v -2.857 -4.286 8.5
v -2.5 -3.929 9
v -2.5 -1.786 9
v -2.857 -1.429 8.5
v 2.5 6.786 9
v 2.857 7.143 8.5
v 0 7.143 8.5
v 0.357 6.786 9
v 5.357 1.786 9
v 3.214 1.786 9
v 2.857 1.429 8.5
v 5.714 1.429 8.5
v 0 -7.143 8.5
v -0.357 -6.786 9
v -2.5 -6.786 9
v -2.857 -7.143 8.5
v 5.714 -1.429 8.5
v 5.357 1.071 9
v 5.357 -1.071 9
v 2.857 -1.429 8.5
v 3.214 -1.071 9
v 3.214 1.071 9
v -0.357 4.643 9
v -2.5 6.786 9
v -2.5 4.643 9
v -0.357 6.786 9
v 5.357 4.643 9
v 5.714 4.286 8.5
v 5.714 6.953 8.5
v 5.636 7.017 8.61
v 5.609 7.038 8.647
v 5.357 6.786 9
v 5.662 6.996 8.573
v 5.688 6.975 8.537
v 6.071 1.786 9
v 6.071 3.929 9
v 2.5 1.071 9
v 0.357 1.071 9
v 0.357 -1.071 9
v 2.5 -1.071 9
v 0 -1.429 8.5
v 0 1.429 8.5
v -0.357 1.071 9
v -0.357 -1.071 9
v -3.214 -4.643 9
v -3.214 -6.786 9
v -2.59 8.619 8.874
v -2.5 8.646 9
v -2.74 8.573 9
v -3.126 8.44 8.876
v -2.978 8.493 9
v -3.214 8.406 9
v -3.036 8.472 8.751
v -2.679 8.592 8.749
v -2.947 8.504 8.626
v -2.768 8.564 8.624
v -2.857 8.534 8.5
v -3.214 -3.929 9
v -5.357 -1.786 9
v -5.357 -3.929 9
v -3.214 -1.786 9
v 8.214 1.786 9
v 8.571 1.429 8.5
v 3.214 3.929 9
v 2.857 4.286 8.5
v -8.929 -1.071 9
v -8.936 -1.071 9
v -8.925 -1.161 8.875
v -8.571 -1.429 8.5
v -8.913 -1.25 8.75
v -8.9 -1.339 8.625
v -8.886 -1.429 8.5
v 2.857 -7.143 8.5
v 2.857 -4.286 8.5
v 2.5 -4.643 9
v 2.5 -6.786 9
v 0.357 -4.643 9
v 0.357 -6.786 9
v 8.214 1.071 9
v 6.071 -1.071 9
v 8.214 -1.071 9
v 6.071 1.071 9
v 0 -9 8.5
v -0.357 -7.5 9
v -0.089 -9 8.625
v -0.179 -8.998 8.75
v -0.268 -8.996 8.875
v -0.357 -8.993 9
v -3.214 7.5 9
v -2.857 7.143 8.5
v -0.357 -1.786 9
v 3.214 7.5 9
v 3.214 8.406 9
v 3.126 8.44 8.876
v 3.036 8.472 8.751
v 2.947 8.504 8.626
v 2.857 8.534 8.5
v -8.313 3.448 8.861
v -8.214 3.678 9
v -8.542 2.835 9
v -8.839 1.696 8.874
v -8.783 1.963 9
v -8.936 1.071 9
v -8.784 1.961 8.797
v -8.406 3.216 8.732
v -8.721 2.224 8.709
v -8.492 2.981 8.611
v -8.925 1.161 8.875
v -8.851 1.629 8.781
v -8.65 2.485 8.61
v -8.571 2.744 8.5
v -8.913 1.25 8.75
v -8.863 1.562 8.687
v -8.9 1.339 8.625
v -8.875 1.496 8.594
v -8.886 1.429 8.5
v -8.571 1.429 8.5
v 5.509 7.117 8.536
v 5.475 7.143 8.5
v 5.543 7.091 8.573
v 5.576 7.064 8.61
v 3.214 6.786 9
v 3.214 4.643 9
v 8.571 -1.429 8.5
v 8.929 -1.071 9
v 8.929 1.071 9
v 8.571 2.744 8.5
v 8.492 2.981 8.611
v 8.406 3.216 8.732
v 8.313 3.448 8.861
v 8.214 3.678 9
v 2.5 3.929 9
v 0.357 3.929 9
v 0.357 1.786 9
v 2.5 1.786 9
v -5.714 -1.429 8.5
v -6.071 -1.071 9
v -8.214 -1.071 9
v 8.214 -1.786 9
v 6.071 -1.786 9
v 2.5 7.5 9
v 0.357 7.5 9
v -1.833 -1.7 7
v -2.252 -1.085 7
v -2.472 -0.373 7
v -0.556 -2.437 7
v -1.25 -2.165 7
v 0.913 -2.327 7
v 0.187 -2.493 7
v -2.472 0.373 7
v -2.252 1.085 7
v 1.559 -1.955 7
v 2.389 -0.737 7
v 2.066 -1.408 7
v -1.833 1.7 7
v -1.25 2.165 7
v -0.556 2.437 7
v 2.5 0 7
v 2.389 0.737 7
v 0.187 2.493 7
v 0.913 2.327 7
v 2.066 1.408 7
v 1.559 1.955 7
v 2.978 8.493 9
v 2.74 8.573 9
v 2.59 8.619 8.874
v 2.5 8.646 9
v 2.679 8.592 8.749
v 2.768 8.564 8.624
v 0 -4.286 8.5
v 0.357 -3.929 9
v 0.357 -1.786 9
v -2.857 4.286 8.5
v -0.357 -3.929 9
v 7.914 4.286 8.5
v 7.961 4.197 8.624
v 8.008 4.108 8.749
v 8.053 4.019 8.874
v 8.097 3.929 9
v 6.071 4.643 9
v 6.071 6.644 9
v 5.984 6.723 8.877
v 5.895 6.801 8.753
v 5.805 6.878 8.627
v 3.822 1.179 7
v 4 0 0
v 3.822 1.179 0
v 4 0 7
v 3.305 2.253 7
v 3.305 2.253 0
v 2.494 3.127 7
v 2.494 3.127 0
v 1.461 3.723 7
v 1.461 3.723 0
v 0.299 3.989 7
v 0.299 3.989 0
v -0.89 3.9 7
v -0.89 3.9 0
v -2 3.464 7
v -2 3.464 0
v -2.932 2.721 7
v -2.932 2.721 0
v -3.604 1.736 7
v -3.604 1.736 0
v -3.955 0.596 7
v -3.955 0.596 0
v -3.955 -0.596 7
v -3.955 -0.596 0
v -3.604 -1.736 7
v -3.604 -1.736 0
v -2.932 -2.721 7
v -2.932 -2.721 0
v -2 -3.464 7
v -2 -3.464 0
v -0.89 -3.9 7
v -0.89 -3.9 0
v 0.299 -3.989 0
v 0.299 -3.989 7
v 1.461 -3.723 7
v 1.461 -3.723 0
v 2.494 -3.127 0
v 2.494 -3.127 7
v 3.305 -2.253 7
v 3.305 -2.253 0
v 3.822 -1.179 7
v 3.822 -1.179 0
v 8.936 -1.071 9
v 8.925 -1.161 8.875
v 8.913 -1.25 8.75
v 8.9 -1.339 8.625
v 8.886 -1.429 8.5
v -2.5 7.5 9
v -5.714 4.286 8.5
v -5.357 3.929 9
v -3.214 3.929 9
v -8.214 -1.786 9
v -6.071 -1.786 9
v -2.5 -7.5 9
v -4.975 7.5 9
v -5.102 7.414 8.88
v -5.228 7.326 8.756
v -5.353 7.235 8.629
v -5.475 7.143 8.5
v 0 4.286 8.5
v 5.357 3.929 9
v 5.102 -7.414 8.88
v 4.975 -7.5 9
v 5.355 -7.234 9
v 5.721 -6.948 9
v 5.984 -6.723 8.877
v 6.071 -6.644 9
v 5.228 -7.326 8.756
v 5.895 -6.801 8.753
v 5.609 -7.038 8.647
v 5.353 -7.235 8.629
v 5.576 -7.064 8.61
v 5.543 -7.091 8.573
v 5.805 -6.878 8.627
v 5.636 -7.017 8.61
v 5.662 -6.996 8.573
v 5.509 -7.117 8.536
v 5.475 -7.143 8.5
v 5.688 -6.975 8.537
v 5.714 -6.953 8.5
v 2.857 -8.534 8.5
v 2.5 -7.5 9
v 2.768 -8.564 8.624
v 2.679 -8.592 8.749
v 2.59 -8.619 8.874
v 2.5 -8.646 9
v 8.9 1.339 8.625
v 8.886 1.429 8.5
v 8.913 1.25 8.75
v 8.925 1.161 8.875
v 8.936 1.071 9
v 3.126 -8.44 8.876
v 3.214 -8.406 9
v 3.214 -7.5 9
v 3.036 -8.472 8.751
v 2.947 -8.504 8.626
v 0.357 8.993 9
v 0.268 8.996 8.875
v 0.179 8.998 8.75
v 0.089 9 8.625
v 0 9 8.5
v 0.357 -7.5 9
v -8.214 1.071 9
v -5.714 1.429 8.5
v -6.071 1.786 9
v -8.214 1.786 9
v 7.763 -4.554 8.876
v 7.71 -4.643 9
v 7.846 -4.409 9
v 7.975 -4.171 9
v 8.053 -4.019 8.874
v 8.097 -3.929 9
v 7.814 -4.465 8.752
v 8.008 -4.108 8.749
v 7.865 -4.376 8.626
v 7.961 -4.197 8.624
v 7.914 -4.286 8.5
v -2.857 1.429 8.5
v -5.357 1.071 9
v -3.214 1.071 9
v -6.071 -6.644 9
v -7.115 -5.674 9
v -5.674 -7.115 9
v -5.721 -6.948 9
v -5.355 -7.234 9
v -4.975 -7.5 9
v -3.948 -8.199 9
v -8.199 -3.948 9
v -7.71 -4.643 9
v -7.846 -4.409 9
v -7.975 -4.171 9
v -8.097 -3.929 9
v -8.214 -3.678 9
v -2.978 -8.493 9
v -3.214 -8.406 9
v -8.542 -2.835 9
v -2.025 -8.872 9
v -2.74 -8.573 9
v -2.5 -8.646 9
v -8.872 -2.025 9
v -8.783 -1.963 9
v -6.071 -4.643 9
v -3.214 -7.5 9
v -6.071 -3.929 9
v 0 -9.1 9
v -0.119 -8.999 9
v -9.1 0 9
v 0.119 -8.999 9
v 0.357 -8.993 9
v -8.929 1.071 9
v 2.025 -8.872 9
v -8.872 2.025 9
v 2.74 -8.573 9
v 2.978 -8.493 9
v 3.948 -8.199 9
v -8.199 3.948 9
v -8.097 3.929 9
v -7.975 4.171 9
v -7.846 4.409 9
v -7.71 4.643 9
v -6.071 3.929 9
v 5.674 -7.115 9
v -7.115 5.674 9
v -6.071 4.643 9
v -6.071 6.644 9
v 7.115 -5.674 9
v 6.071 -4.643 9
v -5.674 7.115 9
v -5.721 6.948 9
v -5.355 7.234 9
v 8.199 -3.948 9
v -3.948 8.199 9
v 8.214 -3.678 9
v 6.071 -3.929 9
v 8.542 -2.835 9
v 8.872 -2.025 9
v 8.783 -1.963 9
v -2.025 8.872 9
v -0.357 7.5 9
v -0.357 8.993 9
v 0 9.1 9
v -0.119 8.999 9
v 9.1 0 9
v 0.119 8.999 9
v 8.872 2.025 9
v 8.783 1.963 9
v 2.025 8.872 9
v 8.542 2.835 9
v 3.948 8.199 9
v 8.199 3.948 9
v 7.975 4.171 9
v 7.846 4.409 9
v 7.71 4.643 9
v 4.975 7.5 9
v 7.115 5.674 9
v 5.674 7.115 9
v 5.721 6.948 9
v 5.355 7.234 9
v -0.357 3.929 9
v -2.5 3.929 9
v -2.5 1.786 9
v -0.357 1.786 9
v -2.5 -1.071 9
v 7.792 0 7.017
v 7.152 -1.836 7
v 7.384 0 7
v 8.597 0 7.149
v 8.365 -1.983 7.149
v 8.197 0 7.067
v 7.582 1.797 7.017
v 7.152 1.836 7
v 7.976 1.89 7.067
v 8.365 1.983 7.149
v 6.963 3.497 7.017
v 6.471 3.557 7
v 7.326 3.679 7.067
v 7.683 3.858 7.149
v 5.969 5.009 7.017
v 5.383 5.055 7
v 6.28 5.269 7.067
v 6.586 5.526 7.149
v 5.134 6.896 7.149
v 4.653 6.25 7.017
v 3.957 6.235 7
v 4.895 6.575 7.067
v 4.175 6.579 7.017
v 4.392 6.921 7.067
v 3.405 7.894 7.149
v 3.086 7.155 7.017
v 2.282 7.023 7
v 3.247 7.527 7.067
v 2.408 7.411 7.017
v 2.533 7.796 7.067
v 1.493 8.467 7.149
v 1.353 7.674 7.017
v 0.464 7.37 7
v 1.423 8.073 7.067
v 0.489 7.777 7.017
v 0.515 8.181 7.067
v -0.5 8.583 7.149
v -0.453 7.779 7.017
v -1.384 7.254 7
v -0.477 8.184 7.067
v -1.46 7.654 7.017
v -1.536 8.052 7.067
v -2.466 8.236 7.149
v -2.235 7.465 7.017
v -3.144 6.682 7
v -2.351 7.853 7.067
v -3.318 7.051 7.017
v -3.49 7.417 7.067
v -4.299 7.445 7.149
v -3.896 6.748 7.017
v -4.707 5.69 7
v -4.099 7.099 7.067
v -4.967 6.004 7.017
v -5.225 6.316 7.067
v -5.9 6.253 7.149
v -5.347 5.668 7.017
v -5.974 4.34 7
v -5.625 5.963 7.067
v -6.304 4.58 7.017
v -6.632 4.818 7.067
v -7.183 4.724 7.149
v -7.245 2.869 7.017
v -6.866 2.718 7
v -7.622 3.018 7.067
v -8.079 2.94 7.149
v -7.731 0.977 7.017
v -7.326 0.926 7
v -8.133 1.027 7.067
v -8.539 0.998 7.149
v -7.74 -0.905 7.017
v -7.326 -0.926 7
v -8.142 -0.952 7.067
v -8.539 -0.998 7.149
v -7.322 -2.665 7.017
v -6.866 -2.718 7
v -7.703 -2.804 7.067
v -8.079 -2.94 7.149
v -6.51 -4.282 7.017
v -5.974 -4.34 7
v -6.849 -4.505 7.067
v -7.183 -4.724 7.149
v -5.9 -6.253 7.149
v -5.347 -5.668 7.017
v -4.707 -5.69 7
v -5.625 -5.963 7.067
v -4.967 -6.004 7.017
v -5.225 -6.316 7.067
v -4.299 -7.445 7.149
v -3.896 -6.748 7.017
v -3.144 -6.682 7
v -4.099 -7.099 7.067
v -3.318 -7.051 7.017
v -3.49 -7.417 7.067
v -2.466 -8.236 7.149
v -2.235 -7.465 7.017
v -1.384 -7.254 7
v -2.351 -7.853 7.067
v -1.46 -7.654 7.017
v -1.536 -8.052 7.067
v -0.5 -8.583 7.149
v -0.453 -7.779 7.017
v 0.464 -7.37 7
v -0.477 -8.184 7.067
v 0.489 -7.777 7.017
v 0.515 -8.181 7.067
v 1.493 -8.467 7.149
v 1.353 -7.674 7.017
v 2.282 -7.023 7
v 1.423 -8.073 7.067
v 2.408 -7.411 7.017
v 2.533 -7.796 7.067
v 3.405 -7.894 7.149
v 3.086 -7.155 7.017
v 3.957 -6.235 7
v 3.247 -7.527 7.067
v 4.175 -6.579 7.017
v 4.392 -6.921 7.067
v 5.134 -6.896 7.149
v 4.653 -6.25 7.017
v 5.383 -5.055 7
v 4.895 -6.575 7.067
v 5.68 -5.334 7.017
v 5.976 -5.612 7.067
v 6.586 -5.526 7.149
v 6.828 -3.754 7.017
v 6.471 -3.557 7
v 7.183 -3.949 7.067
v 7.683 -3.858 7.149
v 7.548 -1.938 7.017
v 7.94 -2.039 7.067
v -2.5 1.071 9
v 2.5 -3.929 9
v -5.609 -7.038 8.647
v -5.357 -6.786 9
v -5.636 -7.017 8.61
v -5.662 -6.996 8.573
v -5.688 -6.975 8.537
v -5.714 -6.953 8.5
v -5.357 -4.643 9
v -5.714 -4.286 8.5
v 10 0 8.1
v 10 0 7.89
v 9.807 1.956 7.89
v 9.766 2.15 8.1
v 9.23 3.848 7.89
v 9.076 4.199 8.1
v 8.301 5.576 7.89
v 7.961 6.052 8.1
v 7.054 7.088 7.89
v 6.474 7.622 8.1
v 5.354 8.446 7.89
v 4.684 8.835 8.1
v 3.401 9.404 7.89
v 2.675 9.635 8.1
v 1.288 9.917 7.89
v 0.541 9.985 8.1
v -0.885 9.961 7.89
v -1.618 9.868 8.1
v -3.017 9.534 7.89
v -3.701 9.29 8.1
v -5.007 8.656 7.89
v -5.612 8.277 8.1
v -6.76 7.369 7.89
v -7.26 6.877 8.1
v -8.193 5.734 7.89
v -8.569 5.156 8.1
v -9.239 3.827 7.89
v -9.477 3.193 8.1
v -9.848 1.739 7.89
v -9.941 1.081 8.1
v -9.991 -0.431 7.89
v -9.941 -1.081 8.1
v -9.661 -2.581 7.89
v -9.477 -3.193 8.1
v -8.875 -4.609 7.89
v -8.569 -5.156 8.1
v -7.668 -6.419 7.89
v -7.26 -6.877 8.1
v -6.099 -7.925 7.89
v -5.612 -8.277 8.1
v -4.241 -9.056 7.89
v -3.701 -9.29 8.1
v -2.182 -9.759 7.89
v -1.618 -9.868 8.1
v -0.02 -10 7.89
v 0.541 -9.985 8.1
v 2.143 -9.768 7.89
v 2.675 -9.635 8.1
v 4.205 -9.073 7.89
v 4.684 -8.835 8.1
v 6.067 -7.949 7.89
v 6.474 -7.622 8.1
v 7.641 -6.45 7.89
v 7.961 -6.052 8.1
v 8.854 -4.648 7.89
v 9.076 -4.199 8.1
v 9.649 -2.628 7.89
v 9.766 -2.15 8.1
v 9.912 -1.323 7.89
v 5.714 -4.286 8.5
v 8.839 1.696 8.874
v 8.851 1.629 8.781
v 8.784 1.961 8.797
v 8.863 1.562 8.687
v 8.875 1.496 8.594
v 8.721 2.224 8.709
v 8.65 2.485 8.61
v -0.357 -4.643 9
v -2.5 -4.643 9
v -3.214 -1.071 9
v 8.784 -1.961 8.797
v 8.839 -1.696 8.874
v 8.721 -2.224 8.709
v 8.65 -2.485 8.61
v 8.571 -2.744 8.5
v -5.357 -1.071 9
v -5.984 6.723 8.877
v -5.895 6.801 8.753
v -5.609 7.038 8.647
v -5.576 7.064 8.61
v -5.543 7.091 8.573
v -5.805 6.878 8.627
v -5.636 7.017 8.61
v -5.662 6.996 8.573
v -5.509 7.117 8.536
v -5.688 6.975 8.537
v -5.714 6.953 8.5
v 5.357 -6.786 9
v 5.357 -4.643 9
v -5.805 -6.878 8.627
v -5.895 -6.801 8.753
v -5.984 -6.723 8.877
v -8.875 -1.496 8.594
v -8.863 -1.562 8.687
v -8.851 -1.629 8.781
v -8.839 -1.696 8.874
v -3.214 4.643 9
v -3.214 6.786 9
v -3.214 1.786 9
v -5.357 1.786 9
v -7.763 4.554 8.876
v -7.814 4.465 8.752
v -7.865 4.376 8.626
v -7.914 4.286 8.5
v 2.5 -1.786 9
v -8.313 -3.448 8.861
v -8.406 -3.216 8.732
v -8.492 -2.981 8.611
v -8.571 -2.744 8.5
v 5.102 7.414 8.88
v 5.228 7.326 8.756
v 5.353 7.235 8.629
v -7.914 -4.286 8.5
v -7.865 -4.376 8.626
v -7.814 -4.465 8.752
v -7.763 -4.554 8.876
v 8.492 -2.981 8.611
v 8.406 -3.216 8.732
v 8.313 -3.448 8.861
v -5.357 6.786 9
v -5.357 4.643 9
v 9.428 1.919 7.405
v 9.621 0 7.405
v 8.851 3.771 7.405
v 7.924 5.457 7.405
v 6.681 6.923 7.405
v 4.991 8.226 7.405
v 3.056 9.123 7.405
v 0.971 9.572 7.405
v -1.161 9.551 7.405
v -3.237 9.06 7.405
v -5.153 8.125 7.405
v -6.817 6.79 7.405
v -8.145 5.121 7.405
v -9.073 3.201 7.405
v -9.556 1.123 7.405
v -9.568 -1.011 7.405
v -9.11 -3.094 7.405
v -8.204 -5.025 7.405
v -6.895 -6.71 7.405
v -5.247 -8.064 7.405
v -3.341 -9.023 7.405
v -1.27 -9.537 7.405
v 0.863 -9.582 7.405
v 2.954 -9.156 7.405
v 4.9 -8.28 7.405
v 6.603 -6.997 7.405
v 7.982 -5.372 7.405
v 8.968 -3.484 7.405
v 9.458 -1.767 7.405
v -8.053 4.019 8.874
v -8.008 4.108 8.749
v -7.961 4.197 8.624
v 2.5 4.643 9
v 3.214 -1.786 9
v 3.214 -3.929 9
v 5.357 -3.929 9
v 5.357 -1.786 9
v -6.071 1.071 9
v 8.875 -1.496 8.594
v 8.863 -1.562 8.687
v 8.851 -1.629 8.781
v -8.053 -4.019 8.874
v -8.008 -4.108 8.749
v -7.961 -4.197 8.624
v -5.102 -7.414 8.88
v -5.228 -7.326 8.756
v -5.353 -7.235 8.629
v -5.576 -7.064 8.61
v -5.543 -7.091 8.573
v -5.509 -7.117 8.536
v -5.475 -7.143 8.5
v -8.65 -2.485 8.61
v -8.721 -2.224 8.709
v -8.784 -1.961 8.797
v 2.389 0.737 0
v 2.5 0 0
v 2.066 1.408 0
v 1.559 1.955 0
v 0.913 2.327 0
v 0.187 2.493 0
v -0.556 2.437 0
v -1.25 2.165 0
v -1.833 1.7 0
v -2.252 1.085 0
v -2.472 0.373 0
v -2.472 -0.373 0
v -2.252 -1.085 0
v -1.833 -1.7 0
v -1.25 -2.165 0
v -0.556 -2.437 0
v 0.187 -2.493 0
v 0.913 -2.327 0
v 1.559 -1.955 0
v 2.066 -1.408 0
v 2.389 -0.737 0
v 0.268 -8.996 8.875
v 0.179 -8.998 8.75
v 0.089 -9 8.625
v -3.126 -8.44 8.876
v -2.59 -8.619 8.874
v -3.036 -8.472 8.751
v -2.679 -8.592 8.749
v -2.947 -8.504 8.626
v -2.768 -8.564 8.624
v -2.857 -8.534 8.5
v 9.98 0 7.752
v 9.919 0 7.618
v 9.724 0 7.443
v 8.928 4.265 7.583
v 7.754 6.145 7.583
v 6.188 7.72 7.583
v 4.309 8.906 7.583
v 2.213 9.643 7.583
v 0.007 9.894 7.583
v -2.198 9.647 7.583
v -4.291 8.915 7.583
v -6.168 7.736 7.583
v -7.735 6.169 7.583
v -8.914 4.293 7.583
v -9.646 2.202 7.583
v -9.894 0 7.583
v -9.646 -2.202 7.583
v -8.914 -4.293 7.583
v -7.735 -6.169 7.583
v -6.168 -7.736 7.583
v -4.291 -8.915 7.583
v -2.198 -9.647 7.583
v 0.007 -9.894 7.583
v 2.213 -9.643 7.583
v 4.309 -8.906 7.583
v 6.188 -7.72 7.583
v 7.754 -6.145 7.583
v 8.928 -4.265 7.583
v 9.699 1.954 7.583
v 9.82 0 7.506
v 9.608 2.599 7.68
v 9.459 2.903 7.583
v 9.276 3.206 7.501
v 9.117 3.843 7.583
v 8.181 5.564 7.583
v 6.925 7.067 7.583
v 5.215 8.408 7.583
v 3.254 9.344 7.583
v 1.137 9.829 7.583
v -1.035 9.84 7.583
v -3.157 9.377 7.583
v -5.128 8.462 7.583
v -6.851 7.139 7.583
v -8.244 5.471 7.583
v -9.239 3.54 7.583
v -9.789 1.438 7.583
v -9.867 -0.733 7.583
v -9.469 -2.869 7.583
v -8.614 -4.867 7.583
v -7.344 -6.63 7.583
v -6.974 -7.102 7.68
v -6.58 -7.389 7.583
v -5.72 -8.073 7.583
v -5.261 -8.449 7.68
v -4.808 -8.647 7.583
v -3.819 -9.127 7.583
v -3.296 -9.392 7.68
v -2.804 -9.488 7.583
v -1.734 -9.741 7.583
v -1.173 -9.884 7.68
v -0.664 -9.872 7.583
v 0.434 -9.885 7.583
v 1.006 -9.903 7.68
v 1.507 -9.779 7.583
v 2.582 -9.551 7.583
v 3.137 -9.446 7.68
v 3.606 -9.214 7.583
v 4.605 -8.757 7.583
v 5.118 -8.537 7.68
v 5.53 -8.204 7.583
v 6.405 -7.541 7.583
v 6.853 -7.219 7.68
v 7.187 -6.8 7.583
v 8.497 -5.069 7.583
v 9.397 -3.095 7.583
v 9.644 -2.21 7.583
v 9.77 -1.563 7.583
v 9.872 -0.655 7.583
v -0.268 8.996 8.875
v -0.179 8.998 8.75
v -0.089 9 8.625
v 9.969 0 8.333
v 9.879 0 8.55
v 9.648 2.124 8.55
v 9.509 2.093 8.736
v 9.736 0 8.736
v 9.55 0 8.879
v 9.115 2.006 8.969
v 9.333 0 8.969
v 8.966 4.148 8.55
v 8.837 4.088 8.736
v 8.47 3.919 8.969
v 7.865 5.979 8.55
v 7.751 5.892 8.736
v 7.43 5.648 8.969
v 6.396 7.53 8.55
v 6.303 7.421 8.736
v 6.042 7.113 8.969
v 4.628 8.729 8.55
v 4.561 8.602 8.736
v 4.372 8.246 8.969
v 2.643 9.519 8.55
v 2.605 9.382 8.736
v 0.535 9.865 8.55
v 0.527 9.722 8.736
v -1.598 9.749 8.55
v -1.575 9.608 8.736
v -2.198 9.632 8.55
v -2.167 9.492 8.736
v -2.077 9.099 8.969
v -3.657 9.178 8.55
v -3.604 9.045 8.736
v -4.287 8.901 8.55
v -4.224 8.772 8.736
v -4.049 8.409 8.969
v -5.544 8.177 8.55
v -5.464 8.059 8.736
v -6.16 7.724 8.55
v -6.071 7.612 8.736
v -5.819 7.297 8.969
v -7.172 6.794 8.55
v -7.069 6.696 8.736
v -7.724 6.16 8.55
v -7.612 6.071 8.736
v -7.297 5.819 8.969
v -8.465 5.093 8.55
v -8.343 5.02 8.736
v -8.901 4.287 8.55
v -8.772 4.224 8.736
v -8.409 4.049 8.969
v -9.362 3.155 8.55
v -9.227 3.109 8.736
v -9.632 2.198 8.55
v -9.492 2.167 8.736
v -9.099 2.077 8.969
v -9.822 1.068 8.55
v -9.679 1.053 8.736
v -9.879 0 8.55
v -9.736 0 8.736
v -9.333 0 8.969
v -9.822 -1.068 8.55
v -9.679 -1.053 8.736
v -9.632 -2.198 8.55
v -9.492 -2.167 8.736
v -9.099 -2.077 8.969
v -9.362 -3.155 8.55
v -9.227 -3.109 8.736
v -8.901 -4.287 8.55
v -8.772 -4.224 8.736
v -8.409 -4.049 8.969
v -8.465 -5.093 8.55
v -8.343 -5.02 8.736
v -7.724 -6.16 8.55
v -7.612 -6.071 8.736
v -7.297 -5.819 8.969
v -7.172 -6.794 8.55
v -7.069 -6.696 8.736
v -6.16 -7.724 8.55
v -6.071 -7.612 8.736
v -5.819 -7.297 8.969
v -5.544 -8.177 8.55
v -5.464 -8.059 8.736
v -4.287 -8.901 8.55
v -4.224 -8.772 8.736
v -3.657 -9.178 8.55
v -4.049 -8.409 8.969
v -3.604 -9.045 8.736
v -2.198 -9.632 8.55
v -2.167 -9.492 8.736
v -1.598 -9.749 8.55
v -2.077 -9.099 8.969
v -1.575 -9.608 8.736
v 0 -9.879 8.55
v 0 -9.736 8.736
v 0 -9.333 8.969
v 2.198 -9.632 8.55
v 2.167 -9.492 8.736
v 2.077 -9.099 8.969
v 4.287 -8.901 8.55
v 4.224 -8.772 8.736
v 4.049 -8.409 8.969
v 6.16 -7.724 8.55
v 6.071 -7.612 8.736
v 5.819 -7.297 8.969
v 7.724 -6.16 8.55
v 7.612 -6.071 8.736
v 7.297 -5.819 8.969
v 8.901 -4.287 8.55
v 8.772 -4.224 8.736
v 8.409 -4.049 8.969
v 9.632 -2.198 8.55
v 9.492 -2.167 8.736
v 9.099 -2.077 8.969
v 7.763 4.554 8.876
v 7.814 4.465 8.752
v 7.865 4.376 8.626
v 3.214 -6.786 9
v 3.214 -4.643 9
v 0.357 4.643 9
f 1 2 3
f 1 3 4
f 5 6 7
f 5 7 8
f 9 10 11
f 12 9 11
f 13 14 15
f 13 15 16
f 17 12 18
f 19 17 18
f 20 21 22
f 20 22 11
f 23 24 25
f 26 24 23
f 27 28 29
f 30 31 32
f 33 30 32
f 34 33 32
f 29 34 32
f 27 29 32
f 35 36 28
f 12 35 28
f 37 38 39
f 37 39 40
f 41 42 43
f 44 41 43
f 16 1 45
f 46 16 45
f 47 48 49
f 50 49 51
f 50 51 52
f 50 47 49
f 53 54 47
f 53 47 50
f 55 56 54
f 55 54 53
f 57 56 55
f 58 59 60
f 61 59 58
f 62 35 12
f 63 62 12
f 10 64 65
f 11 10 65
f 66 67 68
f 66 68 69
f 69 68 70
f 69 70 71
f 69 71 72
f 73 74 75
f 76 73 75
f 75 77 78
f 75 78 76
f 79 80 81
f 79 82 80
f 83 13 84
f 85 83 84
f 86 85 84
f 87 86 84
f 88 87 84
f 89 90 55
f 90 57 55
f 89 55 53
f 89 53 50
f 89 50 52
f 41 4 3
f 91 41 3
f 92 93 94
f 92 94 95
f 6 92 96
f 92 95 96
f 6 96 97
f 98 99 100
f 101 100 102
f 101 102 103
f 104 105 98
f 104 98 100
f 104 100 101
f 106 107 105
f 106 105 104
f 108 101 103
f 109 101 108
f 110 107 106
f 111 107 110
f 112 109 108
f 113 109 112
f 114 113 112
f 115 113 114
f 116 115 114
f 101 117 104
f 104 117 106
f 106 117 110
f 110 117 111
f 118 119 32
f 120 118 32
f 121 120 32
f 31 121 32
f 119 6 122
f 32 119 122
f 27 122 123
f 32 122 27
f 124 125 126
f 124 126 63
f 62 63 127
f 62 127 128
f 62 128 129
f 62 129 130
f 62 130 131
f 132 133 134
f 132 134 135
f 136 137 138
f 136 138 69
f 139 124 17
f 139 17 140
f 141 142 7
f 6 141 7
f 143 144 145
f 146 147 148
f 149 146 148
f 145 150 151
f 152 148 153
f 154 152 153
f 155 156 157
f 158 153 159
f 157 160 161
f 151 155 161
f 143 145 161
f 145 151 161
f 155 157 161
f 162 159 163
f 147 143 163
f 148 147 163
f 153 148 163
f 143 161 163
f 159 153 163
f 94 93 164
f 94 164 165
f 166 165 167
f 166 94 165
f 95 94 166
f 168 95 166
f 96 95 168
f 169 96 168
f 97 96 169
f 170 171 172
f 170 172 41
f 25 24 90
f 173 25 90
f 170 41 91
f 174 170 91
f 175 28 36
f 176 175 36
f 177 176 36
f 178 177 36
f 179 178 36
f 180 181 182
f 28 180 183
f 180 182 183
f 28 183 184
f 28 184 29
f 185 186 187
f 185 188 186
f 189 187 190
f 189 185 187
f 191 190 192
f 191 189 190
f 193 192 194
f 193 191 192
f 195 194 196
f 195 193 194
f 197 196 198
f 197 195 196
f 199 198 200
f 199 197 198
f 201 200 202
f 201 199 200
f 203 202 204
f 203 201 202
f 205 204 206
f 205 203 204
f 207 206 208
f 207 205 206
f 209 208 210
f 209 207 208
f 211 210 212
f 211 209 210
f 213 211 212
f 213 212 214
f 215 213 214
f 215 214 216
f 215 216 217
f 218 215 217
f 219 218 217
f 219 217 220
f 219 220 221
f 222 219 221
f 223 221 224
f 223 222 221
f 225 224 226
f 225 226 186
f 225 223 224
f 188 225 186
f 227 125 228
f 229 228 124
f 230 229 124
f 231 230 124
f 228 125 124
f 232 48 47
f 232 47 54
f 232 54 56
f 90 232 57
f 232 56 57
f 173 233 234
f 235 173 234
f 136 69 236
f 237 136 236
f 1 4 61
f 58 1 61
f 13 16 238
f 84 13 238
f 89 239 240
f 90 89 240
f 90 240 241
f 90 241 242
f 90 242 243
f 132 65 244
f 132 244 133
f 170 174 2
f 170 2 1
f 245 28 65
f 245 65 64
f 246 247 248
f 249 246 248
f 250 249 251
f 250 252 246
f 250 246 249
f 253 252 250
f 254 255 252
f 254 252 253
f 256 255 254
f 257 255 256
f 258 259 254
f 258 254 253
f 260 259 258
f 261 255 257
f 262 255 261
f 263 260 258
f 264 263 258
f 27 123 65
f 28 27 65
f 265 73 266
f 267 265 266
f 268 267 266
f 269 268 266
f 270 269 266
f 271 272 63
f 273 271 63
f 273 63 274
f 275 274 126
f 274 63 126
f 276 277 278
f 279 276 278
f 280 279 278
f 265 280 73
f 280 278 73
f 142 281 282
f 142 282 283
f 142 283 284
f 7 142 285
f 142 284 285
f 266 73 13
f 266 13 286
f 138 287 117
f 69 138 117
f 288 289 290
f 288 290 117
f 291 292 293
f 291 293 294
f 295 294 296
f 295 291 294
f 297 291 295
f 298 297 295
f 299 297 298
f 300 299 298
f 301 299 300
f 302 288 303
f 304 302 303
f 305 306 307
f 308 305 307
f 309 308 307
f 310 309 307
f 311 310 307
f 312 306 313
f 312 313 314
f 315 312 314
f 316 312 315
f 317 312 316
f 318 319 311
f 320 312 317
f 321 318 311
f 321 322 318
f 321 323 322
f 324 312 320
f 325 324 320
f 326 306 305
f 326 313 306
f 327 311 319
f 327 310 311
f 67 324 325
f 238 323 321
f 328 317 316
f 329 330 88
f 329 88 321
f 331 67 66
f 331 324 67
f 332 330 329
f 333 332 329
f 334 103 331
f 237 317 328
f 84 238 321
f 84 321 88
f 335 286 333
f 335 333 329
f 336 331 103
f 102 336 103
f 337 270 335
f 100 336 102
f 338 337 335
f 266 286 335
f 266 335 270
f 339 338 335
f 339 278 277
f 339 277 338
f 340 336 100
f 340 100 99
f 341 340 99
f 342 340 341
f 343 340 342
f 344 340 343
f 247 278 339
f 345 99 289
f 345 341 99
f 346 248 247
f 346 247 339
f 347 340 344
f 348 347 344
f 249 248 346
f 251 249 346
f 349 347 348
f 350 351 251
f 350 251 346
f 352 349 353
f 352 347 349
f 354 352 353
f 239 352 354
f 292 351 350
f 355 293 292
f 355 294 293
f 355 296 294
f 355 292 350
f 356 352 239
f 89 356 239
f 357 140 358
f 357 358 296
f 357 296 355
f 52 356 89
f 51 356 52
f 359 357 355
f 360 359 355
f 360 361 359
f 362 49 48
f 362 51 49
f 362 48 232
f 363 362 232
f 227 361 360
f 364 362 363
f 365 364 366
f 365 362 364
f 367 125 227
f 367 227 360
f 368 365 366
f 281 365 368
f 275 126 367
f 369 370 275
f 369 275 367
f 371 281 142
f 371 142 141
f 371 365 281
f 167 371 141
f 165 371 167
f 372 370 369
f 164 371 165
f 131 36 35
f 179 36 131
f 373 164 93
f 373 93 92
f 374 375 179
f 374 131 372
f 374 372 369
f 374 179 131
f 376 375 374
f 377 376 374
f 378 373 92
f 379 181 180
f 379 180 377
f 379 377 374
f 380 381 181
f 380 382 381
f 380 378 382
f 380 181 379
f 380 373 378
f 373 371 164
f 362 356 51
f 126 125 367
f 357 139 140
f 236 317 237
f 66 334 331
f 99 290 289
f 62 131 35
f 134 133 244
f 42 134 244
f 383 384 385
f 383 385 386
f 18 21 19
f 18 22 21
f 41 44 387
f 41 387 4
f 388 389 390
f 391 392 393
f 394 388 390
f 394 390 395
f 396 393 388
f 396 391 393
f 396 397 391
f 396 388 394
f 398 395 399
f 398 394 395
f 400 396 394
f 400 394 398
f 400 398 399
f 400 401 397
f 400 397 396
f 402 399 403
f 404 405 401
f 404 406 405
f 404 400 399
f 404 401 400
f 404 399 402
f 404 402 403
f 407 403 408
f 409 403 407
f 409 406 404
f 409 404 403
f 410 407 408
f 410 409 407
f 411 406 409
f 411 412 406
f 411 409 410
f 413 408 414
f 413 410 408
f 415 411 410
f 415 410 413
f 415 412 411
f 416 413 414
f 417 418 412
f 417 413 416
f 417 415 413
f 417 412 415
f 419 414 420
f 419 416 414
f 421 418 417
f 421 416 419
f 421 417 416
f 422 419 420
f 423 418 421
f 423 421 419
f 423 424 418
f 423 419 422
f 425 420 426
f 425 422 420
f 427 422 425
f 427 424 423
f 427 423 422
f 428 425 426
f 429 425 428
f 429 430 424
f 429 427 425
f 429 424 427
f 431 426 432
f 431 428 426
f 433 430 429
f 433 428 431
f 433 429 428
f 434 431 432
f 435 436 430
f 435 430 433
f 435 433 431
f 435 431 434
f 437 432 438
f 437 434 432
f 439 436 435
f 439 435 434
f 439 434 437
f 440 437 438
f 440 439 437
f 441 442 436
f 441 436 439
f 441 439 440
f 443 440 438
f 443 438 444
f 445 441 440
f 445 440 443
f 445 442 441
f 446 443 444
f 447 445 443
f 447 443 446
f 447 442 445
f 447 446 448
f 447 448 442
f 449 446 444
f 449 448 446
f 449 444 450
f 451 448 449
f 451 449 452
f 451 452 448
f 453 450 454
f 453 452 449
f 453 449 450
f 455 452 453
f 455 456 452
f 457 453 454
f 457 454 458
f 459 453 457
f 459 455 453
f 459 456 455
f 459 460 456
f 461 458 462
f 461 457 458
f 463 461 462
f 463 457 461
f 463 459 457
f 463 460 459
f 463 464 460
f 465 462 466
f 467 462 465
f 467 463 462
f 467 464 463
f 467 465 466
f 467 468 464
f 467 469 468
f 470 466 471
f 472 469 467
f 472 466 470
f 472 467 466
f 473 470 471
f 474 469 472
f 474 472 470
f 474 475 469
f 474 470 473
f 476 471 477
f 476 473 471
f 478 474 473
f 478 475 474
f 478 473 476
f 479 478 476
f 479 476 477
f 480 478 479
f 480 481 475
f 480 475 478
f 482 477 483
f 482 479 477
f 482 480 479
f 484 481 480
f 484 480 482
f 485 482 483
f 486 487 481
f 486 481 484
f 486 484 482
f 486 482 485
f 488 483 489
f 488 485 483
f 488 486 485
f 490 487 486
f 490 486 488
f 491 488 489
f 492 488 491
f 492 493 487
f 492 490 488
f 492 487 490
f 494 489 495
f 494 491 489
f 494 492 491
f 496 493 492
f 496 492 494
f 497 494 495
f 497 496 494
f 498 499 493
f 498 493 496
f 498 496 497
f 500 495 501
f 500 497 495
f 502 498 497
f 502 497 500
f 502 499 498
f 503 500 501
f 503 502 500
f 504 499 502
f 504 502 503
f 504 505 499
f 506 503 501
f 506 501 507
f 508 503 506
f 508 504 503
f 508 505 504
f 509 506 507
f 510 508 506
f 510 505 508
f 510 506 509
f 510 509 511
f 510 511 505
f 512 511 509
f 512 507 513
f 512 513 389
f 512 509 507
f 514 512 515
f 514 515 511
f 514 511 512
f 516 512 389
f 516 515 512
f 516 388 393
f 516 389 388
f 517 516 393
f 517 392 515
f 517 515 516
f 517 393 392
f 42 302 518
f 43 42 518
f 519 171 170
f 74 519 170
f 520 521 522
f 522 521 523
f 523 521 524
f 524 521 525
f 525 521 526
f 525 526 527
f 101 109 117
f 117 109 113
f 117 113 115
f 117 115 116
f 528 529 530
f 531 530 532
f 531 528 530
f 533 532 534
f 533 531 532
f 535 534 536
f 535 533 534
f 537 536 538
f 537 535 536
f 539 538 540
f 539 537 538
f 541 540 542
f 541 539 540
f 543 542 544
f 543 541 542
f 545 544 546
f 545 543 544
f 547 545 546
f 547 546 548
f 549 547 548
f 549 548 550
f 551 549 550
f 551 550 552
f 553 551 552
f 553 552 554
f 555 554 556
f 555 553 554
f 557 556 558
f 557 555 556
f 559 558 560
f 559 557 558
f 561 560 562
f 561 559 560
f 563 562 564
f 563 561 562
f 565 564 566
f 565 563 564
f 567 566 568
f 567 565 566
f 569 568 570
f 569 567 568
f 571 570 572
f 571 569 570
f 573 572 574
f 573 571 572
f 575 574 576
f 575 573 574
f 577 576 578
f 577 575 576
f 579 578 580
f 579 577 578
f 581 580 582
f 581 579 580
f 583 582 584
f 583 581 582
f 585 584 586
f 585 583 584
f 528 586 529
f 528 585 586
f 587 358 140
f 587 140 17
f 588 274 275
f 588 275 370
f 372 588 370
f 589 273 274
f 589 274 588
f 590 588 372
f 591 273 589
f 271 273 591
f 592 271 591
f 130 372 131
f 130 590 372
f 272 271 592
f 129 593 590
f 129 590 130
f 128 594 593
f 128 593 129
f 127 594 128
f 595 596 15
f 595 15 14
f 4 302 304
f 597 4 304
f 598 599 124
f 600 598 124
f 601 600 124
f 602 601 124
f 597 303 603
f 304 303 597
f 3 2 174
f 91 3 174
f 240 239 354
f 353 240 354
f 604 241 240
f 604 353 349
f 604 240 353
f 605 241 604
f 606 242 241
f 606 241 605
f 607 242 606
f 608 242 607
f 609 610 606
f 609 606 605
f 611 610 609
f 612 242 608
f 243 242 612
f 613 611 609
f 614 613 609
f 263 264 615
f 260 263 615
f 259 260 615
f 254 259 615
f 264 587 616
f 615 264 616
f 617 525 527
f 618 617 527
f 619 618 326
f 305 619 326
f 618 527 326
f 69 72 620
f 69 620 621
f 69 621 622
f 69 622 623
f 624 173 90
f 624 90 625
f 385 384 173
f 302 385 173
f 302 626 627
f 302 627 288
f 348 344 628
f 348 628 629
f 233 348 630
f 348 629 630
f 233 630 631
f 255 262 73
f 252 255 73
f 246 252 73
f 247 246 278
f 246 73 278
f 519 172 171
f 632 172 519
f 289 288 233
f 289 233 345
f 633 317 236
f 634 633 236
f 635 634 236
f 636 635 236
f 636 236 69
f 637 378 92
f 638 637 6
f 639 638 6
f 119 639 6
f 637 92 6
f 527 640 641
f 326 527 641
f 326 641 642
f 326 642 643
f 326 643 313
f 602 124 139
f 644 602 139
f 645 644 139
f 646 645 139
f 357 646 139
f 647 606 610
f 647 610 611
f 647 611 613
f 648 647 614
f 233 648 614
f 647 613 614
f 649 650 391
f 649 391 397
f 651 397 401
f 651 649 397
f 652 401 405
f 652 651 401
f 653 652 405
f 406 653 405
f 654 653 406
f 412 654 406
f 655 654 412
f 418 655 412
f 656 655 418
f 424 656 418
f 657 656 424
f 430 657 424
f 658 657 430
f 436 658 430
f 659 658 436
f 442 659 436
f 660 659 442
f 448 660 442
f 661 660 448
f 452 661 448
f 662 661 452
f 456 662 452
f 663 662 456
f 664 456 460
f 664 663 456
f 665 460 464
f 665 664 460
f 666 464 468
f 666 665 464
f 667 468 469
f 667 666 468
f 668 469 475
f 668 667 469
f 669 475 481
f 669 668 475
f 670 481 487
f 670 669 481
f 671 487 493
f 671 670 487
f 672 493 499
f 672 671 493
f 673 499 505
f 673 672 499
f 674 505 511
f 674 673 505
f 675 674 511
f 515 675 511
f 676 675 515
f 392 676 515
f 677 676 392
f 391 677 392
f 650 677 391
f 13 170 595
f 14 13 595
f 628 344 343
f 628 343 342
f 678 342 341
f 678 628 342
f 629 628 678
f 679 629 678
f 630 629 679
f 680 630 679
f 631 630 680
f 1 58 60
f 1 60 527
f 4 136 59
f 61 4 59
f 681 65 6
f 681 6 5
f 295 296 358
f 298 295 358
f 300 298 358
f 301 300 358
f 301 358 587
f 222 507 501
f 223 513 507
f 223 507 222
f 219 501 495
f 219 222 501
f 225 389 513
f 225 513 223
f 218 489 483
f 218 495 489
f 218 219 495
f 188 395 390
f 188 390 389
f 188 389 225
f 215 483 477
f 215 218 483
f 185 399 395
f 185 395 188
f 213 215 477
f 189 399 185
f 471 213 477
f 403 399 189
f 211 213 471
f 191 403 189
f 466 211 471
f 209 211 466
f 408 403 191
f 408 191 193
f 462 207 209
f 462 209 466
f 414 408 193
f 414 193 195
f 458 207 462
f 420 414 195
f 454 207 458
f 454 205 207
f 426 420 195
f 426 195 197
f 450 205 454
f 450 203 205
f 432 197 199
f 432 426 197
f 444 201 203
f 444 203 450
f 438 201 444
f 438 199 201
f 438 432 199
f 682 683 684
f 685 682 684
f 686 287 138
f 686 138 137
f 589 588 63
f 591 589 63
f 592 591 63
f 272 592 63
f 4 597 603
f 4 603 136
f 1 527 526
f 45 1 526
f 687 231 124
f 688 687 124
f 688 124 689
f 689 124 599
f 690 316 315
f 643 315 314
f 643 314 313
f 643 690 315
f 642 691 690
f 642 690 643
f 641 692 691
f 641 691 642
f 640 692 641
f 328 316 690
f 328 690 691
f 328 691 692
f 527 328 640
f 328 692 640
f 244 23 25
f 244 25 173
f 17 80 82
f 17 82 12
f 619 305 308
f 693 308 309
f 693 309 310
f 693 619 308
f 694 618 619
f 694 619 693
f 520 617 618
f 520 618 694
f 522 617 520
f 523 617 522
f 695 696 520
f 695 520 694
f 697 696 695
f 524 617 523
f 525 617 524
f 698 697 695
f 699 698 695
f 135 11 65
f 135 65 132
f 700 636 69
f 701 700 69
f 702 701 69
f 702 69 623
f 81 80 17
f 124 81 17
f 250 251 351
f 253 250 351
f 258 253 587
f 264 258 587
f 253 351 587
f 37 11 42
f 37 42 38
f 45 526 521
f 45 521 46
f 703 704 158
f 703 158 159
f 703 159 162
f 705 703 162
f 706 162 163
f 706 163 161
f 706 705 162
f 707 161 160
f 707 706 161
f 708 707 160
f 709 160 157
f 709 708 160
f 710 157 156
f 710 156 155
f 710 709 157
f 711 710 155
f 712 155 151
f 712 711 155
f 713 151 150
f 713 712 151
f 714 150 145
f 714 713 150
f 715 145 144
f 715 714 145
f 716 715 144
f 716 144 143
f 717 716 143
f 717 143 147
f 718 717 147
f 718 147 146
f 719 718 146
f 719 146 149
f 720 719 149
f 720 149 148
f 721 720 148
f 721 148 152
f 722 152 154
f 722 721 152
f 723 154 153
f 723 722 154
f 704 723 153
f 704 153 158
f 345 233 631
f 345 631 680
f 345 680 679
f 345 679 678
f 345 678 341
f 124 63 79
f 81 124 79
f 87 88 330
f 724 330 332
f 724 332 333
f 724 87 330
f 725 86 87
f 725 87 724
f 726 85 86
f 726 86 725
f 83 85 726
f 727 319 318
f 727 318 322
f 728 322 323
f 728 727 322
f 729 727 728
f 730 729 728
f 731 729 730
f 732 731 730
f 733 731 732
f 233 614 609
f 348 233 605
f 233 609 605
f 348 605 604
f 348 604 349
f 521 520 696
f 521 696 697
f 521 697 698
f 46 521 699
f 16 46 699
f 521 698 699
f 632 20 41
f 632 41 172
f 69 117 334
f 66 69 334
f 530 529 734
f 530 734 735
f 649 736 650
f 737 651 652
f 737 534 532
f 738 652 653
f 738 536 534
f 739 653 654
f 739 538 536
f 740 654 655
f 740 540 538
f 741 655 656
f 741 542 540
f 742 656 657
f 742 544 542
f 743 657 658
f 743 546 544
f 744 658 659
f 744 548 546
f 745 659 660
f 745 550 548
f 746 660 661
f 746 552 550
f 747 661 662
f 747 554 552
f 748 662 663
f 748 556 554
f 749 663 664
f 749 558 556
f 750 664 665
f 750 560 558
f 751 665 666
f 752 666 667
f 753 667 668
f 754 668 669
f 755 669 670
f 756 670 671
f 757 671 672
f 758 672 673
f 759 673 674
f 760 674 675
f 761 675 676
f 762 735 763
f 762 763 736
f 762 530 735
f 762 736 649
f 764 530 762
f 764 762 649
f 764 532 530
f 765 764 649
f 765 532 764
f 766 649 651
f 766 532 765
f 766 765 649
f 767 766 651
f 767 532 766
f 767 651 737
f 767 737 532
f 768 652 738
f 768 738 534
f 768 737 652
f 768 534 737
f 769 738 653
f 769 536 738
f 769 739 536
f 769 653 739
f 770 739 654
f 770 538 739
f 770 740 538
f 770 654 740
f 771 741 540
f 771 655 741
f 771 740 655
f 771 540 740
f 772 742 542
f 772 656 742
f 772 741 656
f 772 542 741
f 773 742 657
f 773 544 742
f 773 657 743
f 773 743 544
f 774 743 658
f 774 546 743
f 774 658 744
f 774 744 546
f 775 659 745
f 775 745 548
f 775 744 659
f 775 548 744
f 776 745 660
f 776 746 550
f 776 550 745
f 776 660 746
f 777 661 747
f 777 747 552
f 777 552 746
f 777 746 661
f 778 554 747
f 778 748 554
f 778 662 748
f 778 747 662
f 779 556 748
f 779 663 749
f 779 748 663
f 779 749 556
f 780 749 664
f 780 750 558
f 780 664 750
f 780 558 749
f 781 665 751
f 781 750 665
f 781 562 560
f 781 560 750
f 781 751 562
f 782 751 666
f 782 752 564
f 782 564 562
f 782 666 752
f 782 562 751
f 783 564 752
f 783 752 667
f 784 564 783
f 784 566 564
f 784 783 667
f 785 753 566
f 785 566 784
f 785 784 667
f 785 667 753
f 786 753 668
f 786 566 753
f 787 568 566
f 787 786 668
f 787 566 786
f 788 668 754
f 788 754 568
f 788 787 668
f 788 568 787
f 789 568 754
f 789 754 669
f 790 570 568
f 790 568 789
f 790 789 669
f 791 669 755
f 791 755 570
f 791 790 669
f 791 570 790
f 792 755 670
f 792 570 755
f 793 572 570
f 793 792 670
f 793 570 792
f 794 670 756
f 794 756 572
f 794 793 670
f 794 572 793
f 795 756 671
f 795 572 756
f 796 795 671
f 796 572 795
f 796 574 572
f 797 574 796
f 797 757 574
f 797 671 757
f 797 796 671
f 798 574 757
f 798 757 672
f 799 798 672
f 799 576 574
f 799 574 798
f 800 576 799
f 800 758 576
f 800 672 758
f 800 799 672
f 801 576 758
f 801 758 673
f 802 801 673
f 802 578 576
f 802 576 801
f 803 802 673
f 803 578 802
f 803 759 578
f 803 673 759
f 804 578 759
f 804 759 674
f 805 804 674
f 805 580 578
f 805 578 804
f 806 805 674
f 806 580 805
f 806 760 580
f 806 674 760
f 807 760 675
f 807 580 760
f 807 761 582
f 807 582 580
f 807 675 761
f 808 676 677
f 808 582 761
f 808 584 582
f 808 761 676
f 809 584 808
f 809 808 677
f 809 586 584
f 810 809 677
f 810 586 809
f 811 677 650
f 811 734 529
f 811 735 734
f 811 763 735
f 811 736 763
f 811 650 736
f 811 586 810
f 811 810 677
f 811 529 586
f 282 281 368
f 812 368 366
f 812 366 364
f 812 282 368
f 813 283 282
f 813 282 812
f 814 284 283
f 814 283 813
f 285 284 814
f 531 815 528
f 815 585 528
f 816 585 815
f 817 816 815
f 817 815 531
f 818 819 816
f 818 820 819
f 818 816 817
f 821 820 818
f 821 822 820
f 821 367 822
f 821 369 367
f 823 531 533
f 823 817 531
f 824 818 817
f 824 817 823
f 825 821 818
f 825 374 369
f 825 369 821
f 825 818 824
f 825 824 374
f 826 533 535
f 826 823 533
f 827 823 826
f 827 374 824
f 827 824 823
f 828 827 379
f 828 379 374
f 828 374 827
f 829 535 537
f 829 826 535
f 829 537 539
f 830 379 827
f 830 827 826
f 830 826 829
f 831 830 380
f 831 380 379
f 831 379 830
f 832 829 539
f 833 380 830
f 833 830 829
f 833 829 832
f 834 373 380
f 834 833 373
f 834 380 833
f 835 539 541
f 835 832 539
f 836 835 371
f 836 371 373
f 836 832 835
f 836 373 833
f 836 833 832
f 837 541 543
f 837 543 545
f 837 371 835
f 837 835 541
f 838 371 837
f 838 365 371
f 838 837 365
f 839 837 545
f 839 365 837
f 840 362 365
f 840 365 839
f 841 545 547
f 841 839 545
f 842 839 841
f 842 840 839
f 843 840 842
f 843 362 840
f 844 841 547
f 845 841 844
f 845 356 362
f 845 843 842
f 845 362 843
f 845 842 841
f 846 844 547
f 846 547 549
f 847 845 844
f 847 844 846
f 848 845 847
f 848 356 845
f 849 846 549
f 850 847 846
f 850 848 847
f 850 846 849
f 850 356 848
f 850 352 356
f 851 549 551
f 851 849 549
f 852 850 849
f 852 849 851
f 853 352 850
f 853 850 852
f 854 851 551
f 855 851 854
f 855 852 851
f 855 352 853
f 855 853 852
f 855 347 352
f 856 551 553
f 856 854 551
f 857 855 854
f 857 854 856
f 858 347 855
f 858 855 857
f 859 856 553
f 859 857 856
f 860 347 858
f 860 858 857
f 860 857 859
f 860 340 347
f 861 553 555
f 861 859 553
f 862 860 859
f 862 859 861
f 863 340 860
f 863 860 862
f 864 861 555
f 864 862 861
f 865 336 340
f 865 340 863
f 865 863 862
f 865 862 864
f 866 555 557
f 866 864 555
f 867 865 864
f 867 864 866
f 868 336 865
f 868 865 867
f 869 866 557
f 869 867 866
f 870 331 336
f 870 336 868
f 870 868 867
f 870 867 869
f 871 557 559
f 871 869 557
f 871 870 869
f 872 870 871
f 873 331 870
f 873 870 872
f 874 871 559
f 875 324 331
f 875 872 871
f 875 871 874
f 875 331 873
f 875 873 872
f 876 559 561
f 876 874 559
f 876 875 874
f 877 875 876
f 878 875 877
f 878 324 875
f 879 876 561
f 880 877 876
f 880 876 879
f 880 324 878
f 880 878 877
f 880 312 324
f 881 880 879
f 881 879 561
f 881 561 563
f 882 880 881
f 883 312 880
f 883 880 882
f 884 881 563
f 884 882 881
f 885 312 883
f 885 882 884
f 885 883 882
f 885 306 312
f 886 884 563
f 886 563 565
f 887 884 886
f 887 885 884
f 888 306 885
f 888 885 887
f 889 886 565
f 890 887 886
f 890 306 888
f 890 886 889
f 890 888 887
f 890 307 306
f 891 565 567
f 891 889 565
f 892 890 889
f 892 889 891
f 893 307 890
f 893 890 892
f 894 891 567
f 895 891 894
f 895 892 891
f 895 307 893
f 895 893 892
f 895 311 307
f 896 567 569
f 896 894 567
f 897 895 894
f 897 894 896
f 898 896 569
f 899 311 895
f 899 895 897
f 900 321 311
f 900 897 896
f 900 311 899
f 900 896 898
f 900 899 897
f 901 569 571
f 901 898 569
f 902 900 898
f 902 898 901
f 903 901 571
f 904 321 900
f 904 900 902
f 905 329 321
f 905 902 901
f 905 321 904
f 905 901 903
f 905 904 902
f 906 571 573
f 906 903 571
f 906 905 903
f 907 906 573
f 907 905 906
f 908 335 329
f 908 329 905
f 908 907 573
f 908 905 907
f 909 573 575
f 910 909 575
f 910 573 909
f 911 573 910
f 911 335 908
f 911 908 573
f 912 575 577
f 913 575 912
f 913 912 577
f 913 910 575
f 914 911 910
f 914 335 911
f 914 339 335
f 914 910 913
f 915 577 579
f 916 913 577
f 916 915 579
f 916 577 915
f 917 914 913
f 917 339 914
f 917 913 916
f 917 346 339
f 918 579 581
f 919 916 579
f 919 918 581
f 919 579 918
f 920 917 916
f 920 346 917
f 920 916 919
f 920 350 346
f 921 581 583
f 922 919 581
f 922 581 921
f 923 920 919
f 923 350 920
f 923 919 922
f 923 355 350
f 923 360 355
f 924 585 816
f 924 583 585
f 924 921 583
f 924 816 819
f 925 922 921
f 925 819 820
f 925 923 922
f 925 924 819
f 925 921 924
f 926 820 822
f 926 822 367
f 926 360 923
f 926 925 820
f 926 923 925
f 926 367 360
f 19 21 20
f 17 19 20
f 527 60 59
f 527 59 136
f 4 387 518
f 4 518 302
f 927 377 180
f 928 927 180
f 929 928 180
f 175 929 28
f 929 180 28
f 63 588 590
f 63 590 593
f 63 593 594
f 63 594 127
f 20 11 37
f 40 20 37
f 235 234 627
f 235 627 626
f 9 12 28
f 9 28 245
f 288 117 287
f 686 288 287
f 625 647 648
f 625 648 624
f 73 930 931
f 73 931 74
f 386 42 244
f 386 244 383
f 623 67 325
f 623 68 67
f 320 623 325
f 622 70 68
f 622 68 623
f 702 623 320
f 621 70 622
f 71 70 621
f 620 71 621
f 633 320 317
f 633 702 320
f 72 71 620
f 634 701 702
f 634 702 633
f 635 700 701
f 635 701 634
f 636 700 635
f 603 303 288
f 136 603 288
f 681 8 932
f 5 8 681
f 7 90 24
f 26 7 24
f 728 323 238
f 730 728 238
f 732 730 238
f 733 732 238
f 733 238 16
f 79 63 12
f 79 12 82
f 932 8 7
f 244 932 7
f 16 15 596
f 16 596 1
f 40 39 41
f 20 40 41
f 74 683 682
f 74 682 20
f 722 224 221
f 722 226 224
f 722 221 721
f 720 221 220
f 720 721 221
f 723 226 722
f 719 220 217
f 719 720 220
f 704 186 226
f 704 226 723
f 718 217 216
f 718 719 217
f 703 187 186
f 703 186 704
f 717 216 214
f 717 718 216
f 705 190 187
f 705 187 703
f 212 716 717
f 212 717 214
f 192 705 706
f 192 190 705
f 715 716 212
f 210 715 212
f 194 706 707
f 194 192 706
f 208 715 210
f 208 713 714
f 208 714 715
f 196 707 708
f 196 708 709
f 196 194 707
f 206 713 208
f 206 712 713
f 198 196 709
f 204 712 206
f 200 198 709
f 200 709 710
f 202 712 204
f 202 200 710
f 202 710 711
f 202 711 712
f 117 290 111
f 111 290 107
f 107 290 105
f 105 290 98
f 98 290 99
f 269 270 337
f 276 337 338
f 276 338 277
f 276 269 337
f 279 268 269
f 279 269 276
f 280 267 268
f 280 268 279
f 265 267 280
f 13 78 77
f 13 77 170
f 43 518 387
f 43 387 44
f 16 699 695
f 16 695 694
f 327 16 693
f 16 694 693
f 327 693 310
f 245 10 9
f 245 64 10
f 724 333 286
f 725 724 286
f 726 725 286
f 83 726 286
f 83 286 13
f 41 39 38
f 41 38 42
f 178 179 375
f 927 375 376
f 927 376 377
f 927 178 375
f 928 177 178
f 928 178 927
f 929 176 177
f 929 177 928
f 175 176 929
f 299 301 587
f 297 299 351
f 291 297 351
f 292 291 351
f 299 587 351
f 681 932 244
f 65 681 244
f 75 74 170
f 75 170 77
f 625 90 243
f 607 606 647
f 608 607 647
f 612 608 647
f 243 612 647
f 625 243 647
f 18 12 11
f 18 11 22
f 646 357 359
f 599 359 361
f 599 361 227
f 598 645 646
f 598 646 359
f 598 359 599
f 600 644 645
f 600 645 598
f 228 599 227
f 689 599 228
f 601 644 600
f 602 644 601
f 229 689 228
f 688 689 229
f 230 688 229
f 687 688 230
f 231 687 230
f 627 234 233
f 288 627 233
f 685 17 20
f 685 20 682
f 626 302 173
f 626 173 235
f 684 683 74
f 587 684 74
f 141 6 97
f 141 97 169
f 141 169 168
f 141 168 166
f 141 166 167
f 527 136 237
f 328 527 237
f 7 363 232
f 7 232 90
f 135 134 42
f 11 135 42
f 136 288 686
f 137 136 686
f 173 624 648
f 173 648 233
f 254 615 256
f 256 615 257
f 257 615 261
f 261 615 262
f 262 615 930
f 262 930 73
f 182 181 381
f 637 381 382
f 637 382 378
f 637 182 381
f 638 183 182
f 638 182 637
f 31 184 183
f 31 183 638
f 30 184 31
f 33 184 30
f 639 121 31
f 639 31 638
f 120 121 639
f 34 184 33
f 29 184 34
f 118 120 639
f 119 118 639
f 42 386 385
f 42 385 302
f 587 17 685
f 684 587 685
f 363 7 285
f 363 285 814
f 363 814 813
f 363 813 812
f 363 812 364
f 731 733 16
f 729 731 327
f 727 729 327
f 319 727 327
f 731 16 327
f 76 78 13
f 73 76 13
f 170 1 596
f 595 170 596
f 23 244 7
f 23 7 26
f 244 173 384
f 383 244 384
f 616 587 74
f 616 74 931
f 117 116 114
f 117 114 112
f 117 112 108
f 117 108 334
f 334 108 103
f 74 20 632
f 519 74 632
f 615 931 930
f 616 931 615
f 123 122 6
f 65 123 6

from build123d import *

# Parameters (mm, degrees)
CYLINDER001_R     = 2.5
CYLINDER001_DEPTH = 7
FILLET_1_R        = 5
FILLET_2_R        = 0.9
FILLET_3_R        = 0.5
CYLINDER_R        = 9
CYLINDER_DEPTH    = 1
PAD_DEPTH         = 20
PAD001_DEPTH      = 20


with BuildPart() as handle_pocket:
    # Cylinder001 → Cylinder001 (new body)
    with BuildSketch(Plane.XY):
        Circle(CYLINDER001_R)
    extrude(amount=CYLINDER001_DEPTH)


with BuildPart() as base_fillet:
    # Sketch → Revolution (revolve)
    with BuildSketch(Plane.XZ):
        Polygon((0, 0), (4, 0), (4, 7), (8, 7), (10, 7.5), (10, 9), (9, 9), (9, 8), (0, 8), align=None)
    revolve(axis=Axis((0, 0, 0), (0, 0, 1)))

    # Fillet 1
    fillet_1_edges = [base_fillet.edges().sort_by_distance(p)[0] for p in [
        (-8, 0, 7),
    ]]
    fillet(fillet_1_edges, radius=FILLET_1_R)

    # Fillet 2
    fillet_2_edges = [base_fillet.edges().sort_by_distance(p)[0] for p in [
        (-10, 0, 9),
    ]]
    fillet(fillet_2_edges, radius=FILLET_2_R)

    # Fillet 3
    fillet_3_edges = [base_fillet.edges().sort_by_distance(p)[0] for p in [
        (-10, 0, 7.5),
    ]]
    fillet(fillet_3_edges, radius=FILLET_3_R)


with BuildPart() as knurling_cylinder:
    # Cylinder → Cylinder (new body)
    with BuildSketch(Plane.XY.offset(4)):
        Circle(CYLINDER_R)
    extrude(amount=CYLINDER_DEPTH)


with BuildPart() as knurling_xz_pad:
    # MirroredSketch → Pad (new body)
    with BuildSketch(Plane.XZ.offset(-10)):
        Polygon((7.142857, 6.5), (5.714286, 4.5), (4.285714, 6.5), (2.857143, 4.5), (1.428571, 6.5), (0, 4.5), (-1.428571, 6.5), (-2.857143, 4.5), (-4.285714, 6.5), (-5.714286, 4.5), (-7.142857, 6.5), (-8.571429, 4.5), (-10, 6.5), (-10, 7.5), (10, 7.5), (10, 6.5), (8.571429, 4.5), align=None)
    extrude(amount=PAD_DEPTH)


with BuildPart() as handle:
    # MirroredSketch002 → Pad001 (new body)
    with BuildSketch(Plane.YZ.offset(-10)):
        Polygon((7.142857, 4.5), (5.714286, 6.5), (4.285714, 4.5), (2.857143, 6.5), (1.428571, 4.5), (0, 6.5), (-1.428571, 4.5), (-2.857143, 6.5), (-4.285714, 4.5), (-5.714286, 6.5), (-7.142857, 4.5), (-8.571429, 6.5), (-10, 4.5), (-10, 3.5), (10, 3.5), (10, 4.5), (8.571429, 6.5), align=None)
    extrude(amount=PAD001_DEPTH)

    # Cut: cut Knurling XZ Pad
    add(knurling_xz_pad.part, mode=Mode.SUBTRACT)

    # Common: intersect Knurling Cylinder
    add(knurling_cylinder.part, mode=Mode.INTERSECT)


with BuildPart() as handle_1:
    # Common placement: moved
    add(handle.part.moved(Location((0, 0, 4))))

    # Fusion: union Base Fillet
    add(base_fillet.part)

    # Cut001: cut Handle Pocket
    add(handle_pocket.part, mode=Mode.SUBTRACT)


solid = handle_1.part
